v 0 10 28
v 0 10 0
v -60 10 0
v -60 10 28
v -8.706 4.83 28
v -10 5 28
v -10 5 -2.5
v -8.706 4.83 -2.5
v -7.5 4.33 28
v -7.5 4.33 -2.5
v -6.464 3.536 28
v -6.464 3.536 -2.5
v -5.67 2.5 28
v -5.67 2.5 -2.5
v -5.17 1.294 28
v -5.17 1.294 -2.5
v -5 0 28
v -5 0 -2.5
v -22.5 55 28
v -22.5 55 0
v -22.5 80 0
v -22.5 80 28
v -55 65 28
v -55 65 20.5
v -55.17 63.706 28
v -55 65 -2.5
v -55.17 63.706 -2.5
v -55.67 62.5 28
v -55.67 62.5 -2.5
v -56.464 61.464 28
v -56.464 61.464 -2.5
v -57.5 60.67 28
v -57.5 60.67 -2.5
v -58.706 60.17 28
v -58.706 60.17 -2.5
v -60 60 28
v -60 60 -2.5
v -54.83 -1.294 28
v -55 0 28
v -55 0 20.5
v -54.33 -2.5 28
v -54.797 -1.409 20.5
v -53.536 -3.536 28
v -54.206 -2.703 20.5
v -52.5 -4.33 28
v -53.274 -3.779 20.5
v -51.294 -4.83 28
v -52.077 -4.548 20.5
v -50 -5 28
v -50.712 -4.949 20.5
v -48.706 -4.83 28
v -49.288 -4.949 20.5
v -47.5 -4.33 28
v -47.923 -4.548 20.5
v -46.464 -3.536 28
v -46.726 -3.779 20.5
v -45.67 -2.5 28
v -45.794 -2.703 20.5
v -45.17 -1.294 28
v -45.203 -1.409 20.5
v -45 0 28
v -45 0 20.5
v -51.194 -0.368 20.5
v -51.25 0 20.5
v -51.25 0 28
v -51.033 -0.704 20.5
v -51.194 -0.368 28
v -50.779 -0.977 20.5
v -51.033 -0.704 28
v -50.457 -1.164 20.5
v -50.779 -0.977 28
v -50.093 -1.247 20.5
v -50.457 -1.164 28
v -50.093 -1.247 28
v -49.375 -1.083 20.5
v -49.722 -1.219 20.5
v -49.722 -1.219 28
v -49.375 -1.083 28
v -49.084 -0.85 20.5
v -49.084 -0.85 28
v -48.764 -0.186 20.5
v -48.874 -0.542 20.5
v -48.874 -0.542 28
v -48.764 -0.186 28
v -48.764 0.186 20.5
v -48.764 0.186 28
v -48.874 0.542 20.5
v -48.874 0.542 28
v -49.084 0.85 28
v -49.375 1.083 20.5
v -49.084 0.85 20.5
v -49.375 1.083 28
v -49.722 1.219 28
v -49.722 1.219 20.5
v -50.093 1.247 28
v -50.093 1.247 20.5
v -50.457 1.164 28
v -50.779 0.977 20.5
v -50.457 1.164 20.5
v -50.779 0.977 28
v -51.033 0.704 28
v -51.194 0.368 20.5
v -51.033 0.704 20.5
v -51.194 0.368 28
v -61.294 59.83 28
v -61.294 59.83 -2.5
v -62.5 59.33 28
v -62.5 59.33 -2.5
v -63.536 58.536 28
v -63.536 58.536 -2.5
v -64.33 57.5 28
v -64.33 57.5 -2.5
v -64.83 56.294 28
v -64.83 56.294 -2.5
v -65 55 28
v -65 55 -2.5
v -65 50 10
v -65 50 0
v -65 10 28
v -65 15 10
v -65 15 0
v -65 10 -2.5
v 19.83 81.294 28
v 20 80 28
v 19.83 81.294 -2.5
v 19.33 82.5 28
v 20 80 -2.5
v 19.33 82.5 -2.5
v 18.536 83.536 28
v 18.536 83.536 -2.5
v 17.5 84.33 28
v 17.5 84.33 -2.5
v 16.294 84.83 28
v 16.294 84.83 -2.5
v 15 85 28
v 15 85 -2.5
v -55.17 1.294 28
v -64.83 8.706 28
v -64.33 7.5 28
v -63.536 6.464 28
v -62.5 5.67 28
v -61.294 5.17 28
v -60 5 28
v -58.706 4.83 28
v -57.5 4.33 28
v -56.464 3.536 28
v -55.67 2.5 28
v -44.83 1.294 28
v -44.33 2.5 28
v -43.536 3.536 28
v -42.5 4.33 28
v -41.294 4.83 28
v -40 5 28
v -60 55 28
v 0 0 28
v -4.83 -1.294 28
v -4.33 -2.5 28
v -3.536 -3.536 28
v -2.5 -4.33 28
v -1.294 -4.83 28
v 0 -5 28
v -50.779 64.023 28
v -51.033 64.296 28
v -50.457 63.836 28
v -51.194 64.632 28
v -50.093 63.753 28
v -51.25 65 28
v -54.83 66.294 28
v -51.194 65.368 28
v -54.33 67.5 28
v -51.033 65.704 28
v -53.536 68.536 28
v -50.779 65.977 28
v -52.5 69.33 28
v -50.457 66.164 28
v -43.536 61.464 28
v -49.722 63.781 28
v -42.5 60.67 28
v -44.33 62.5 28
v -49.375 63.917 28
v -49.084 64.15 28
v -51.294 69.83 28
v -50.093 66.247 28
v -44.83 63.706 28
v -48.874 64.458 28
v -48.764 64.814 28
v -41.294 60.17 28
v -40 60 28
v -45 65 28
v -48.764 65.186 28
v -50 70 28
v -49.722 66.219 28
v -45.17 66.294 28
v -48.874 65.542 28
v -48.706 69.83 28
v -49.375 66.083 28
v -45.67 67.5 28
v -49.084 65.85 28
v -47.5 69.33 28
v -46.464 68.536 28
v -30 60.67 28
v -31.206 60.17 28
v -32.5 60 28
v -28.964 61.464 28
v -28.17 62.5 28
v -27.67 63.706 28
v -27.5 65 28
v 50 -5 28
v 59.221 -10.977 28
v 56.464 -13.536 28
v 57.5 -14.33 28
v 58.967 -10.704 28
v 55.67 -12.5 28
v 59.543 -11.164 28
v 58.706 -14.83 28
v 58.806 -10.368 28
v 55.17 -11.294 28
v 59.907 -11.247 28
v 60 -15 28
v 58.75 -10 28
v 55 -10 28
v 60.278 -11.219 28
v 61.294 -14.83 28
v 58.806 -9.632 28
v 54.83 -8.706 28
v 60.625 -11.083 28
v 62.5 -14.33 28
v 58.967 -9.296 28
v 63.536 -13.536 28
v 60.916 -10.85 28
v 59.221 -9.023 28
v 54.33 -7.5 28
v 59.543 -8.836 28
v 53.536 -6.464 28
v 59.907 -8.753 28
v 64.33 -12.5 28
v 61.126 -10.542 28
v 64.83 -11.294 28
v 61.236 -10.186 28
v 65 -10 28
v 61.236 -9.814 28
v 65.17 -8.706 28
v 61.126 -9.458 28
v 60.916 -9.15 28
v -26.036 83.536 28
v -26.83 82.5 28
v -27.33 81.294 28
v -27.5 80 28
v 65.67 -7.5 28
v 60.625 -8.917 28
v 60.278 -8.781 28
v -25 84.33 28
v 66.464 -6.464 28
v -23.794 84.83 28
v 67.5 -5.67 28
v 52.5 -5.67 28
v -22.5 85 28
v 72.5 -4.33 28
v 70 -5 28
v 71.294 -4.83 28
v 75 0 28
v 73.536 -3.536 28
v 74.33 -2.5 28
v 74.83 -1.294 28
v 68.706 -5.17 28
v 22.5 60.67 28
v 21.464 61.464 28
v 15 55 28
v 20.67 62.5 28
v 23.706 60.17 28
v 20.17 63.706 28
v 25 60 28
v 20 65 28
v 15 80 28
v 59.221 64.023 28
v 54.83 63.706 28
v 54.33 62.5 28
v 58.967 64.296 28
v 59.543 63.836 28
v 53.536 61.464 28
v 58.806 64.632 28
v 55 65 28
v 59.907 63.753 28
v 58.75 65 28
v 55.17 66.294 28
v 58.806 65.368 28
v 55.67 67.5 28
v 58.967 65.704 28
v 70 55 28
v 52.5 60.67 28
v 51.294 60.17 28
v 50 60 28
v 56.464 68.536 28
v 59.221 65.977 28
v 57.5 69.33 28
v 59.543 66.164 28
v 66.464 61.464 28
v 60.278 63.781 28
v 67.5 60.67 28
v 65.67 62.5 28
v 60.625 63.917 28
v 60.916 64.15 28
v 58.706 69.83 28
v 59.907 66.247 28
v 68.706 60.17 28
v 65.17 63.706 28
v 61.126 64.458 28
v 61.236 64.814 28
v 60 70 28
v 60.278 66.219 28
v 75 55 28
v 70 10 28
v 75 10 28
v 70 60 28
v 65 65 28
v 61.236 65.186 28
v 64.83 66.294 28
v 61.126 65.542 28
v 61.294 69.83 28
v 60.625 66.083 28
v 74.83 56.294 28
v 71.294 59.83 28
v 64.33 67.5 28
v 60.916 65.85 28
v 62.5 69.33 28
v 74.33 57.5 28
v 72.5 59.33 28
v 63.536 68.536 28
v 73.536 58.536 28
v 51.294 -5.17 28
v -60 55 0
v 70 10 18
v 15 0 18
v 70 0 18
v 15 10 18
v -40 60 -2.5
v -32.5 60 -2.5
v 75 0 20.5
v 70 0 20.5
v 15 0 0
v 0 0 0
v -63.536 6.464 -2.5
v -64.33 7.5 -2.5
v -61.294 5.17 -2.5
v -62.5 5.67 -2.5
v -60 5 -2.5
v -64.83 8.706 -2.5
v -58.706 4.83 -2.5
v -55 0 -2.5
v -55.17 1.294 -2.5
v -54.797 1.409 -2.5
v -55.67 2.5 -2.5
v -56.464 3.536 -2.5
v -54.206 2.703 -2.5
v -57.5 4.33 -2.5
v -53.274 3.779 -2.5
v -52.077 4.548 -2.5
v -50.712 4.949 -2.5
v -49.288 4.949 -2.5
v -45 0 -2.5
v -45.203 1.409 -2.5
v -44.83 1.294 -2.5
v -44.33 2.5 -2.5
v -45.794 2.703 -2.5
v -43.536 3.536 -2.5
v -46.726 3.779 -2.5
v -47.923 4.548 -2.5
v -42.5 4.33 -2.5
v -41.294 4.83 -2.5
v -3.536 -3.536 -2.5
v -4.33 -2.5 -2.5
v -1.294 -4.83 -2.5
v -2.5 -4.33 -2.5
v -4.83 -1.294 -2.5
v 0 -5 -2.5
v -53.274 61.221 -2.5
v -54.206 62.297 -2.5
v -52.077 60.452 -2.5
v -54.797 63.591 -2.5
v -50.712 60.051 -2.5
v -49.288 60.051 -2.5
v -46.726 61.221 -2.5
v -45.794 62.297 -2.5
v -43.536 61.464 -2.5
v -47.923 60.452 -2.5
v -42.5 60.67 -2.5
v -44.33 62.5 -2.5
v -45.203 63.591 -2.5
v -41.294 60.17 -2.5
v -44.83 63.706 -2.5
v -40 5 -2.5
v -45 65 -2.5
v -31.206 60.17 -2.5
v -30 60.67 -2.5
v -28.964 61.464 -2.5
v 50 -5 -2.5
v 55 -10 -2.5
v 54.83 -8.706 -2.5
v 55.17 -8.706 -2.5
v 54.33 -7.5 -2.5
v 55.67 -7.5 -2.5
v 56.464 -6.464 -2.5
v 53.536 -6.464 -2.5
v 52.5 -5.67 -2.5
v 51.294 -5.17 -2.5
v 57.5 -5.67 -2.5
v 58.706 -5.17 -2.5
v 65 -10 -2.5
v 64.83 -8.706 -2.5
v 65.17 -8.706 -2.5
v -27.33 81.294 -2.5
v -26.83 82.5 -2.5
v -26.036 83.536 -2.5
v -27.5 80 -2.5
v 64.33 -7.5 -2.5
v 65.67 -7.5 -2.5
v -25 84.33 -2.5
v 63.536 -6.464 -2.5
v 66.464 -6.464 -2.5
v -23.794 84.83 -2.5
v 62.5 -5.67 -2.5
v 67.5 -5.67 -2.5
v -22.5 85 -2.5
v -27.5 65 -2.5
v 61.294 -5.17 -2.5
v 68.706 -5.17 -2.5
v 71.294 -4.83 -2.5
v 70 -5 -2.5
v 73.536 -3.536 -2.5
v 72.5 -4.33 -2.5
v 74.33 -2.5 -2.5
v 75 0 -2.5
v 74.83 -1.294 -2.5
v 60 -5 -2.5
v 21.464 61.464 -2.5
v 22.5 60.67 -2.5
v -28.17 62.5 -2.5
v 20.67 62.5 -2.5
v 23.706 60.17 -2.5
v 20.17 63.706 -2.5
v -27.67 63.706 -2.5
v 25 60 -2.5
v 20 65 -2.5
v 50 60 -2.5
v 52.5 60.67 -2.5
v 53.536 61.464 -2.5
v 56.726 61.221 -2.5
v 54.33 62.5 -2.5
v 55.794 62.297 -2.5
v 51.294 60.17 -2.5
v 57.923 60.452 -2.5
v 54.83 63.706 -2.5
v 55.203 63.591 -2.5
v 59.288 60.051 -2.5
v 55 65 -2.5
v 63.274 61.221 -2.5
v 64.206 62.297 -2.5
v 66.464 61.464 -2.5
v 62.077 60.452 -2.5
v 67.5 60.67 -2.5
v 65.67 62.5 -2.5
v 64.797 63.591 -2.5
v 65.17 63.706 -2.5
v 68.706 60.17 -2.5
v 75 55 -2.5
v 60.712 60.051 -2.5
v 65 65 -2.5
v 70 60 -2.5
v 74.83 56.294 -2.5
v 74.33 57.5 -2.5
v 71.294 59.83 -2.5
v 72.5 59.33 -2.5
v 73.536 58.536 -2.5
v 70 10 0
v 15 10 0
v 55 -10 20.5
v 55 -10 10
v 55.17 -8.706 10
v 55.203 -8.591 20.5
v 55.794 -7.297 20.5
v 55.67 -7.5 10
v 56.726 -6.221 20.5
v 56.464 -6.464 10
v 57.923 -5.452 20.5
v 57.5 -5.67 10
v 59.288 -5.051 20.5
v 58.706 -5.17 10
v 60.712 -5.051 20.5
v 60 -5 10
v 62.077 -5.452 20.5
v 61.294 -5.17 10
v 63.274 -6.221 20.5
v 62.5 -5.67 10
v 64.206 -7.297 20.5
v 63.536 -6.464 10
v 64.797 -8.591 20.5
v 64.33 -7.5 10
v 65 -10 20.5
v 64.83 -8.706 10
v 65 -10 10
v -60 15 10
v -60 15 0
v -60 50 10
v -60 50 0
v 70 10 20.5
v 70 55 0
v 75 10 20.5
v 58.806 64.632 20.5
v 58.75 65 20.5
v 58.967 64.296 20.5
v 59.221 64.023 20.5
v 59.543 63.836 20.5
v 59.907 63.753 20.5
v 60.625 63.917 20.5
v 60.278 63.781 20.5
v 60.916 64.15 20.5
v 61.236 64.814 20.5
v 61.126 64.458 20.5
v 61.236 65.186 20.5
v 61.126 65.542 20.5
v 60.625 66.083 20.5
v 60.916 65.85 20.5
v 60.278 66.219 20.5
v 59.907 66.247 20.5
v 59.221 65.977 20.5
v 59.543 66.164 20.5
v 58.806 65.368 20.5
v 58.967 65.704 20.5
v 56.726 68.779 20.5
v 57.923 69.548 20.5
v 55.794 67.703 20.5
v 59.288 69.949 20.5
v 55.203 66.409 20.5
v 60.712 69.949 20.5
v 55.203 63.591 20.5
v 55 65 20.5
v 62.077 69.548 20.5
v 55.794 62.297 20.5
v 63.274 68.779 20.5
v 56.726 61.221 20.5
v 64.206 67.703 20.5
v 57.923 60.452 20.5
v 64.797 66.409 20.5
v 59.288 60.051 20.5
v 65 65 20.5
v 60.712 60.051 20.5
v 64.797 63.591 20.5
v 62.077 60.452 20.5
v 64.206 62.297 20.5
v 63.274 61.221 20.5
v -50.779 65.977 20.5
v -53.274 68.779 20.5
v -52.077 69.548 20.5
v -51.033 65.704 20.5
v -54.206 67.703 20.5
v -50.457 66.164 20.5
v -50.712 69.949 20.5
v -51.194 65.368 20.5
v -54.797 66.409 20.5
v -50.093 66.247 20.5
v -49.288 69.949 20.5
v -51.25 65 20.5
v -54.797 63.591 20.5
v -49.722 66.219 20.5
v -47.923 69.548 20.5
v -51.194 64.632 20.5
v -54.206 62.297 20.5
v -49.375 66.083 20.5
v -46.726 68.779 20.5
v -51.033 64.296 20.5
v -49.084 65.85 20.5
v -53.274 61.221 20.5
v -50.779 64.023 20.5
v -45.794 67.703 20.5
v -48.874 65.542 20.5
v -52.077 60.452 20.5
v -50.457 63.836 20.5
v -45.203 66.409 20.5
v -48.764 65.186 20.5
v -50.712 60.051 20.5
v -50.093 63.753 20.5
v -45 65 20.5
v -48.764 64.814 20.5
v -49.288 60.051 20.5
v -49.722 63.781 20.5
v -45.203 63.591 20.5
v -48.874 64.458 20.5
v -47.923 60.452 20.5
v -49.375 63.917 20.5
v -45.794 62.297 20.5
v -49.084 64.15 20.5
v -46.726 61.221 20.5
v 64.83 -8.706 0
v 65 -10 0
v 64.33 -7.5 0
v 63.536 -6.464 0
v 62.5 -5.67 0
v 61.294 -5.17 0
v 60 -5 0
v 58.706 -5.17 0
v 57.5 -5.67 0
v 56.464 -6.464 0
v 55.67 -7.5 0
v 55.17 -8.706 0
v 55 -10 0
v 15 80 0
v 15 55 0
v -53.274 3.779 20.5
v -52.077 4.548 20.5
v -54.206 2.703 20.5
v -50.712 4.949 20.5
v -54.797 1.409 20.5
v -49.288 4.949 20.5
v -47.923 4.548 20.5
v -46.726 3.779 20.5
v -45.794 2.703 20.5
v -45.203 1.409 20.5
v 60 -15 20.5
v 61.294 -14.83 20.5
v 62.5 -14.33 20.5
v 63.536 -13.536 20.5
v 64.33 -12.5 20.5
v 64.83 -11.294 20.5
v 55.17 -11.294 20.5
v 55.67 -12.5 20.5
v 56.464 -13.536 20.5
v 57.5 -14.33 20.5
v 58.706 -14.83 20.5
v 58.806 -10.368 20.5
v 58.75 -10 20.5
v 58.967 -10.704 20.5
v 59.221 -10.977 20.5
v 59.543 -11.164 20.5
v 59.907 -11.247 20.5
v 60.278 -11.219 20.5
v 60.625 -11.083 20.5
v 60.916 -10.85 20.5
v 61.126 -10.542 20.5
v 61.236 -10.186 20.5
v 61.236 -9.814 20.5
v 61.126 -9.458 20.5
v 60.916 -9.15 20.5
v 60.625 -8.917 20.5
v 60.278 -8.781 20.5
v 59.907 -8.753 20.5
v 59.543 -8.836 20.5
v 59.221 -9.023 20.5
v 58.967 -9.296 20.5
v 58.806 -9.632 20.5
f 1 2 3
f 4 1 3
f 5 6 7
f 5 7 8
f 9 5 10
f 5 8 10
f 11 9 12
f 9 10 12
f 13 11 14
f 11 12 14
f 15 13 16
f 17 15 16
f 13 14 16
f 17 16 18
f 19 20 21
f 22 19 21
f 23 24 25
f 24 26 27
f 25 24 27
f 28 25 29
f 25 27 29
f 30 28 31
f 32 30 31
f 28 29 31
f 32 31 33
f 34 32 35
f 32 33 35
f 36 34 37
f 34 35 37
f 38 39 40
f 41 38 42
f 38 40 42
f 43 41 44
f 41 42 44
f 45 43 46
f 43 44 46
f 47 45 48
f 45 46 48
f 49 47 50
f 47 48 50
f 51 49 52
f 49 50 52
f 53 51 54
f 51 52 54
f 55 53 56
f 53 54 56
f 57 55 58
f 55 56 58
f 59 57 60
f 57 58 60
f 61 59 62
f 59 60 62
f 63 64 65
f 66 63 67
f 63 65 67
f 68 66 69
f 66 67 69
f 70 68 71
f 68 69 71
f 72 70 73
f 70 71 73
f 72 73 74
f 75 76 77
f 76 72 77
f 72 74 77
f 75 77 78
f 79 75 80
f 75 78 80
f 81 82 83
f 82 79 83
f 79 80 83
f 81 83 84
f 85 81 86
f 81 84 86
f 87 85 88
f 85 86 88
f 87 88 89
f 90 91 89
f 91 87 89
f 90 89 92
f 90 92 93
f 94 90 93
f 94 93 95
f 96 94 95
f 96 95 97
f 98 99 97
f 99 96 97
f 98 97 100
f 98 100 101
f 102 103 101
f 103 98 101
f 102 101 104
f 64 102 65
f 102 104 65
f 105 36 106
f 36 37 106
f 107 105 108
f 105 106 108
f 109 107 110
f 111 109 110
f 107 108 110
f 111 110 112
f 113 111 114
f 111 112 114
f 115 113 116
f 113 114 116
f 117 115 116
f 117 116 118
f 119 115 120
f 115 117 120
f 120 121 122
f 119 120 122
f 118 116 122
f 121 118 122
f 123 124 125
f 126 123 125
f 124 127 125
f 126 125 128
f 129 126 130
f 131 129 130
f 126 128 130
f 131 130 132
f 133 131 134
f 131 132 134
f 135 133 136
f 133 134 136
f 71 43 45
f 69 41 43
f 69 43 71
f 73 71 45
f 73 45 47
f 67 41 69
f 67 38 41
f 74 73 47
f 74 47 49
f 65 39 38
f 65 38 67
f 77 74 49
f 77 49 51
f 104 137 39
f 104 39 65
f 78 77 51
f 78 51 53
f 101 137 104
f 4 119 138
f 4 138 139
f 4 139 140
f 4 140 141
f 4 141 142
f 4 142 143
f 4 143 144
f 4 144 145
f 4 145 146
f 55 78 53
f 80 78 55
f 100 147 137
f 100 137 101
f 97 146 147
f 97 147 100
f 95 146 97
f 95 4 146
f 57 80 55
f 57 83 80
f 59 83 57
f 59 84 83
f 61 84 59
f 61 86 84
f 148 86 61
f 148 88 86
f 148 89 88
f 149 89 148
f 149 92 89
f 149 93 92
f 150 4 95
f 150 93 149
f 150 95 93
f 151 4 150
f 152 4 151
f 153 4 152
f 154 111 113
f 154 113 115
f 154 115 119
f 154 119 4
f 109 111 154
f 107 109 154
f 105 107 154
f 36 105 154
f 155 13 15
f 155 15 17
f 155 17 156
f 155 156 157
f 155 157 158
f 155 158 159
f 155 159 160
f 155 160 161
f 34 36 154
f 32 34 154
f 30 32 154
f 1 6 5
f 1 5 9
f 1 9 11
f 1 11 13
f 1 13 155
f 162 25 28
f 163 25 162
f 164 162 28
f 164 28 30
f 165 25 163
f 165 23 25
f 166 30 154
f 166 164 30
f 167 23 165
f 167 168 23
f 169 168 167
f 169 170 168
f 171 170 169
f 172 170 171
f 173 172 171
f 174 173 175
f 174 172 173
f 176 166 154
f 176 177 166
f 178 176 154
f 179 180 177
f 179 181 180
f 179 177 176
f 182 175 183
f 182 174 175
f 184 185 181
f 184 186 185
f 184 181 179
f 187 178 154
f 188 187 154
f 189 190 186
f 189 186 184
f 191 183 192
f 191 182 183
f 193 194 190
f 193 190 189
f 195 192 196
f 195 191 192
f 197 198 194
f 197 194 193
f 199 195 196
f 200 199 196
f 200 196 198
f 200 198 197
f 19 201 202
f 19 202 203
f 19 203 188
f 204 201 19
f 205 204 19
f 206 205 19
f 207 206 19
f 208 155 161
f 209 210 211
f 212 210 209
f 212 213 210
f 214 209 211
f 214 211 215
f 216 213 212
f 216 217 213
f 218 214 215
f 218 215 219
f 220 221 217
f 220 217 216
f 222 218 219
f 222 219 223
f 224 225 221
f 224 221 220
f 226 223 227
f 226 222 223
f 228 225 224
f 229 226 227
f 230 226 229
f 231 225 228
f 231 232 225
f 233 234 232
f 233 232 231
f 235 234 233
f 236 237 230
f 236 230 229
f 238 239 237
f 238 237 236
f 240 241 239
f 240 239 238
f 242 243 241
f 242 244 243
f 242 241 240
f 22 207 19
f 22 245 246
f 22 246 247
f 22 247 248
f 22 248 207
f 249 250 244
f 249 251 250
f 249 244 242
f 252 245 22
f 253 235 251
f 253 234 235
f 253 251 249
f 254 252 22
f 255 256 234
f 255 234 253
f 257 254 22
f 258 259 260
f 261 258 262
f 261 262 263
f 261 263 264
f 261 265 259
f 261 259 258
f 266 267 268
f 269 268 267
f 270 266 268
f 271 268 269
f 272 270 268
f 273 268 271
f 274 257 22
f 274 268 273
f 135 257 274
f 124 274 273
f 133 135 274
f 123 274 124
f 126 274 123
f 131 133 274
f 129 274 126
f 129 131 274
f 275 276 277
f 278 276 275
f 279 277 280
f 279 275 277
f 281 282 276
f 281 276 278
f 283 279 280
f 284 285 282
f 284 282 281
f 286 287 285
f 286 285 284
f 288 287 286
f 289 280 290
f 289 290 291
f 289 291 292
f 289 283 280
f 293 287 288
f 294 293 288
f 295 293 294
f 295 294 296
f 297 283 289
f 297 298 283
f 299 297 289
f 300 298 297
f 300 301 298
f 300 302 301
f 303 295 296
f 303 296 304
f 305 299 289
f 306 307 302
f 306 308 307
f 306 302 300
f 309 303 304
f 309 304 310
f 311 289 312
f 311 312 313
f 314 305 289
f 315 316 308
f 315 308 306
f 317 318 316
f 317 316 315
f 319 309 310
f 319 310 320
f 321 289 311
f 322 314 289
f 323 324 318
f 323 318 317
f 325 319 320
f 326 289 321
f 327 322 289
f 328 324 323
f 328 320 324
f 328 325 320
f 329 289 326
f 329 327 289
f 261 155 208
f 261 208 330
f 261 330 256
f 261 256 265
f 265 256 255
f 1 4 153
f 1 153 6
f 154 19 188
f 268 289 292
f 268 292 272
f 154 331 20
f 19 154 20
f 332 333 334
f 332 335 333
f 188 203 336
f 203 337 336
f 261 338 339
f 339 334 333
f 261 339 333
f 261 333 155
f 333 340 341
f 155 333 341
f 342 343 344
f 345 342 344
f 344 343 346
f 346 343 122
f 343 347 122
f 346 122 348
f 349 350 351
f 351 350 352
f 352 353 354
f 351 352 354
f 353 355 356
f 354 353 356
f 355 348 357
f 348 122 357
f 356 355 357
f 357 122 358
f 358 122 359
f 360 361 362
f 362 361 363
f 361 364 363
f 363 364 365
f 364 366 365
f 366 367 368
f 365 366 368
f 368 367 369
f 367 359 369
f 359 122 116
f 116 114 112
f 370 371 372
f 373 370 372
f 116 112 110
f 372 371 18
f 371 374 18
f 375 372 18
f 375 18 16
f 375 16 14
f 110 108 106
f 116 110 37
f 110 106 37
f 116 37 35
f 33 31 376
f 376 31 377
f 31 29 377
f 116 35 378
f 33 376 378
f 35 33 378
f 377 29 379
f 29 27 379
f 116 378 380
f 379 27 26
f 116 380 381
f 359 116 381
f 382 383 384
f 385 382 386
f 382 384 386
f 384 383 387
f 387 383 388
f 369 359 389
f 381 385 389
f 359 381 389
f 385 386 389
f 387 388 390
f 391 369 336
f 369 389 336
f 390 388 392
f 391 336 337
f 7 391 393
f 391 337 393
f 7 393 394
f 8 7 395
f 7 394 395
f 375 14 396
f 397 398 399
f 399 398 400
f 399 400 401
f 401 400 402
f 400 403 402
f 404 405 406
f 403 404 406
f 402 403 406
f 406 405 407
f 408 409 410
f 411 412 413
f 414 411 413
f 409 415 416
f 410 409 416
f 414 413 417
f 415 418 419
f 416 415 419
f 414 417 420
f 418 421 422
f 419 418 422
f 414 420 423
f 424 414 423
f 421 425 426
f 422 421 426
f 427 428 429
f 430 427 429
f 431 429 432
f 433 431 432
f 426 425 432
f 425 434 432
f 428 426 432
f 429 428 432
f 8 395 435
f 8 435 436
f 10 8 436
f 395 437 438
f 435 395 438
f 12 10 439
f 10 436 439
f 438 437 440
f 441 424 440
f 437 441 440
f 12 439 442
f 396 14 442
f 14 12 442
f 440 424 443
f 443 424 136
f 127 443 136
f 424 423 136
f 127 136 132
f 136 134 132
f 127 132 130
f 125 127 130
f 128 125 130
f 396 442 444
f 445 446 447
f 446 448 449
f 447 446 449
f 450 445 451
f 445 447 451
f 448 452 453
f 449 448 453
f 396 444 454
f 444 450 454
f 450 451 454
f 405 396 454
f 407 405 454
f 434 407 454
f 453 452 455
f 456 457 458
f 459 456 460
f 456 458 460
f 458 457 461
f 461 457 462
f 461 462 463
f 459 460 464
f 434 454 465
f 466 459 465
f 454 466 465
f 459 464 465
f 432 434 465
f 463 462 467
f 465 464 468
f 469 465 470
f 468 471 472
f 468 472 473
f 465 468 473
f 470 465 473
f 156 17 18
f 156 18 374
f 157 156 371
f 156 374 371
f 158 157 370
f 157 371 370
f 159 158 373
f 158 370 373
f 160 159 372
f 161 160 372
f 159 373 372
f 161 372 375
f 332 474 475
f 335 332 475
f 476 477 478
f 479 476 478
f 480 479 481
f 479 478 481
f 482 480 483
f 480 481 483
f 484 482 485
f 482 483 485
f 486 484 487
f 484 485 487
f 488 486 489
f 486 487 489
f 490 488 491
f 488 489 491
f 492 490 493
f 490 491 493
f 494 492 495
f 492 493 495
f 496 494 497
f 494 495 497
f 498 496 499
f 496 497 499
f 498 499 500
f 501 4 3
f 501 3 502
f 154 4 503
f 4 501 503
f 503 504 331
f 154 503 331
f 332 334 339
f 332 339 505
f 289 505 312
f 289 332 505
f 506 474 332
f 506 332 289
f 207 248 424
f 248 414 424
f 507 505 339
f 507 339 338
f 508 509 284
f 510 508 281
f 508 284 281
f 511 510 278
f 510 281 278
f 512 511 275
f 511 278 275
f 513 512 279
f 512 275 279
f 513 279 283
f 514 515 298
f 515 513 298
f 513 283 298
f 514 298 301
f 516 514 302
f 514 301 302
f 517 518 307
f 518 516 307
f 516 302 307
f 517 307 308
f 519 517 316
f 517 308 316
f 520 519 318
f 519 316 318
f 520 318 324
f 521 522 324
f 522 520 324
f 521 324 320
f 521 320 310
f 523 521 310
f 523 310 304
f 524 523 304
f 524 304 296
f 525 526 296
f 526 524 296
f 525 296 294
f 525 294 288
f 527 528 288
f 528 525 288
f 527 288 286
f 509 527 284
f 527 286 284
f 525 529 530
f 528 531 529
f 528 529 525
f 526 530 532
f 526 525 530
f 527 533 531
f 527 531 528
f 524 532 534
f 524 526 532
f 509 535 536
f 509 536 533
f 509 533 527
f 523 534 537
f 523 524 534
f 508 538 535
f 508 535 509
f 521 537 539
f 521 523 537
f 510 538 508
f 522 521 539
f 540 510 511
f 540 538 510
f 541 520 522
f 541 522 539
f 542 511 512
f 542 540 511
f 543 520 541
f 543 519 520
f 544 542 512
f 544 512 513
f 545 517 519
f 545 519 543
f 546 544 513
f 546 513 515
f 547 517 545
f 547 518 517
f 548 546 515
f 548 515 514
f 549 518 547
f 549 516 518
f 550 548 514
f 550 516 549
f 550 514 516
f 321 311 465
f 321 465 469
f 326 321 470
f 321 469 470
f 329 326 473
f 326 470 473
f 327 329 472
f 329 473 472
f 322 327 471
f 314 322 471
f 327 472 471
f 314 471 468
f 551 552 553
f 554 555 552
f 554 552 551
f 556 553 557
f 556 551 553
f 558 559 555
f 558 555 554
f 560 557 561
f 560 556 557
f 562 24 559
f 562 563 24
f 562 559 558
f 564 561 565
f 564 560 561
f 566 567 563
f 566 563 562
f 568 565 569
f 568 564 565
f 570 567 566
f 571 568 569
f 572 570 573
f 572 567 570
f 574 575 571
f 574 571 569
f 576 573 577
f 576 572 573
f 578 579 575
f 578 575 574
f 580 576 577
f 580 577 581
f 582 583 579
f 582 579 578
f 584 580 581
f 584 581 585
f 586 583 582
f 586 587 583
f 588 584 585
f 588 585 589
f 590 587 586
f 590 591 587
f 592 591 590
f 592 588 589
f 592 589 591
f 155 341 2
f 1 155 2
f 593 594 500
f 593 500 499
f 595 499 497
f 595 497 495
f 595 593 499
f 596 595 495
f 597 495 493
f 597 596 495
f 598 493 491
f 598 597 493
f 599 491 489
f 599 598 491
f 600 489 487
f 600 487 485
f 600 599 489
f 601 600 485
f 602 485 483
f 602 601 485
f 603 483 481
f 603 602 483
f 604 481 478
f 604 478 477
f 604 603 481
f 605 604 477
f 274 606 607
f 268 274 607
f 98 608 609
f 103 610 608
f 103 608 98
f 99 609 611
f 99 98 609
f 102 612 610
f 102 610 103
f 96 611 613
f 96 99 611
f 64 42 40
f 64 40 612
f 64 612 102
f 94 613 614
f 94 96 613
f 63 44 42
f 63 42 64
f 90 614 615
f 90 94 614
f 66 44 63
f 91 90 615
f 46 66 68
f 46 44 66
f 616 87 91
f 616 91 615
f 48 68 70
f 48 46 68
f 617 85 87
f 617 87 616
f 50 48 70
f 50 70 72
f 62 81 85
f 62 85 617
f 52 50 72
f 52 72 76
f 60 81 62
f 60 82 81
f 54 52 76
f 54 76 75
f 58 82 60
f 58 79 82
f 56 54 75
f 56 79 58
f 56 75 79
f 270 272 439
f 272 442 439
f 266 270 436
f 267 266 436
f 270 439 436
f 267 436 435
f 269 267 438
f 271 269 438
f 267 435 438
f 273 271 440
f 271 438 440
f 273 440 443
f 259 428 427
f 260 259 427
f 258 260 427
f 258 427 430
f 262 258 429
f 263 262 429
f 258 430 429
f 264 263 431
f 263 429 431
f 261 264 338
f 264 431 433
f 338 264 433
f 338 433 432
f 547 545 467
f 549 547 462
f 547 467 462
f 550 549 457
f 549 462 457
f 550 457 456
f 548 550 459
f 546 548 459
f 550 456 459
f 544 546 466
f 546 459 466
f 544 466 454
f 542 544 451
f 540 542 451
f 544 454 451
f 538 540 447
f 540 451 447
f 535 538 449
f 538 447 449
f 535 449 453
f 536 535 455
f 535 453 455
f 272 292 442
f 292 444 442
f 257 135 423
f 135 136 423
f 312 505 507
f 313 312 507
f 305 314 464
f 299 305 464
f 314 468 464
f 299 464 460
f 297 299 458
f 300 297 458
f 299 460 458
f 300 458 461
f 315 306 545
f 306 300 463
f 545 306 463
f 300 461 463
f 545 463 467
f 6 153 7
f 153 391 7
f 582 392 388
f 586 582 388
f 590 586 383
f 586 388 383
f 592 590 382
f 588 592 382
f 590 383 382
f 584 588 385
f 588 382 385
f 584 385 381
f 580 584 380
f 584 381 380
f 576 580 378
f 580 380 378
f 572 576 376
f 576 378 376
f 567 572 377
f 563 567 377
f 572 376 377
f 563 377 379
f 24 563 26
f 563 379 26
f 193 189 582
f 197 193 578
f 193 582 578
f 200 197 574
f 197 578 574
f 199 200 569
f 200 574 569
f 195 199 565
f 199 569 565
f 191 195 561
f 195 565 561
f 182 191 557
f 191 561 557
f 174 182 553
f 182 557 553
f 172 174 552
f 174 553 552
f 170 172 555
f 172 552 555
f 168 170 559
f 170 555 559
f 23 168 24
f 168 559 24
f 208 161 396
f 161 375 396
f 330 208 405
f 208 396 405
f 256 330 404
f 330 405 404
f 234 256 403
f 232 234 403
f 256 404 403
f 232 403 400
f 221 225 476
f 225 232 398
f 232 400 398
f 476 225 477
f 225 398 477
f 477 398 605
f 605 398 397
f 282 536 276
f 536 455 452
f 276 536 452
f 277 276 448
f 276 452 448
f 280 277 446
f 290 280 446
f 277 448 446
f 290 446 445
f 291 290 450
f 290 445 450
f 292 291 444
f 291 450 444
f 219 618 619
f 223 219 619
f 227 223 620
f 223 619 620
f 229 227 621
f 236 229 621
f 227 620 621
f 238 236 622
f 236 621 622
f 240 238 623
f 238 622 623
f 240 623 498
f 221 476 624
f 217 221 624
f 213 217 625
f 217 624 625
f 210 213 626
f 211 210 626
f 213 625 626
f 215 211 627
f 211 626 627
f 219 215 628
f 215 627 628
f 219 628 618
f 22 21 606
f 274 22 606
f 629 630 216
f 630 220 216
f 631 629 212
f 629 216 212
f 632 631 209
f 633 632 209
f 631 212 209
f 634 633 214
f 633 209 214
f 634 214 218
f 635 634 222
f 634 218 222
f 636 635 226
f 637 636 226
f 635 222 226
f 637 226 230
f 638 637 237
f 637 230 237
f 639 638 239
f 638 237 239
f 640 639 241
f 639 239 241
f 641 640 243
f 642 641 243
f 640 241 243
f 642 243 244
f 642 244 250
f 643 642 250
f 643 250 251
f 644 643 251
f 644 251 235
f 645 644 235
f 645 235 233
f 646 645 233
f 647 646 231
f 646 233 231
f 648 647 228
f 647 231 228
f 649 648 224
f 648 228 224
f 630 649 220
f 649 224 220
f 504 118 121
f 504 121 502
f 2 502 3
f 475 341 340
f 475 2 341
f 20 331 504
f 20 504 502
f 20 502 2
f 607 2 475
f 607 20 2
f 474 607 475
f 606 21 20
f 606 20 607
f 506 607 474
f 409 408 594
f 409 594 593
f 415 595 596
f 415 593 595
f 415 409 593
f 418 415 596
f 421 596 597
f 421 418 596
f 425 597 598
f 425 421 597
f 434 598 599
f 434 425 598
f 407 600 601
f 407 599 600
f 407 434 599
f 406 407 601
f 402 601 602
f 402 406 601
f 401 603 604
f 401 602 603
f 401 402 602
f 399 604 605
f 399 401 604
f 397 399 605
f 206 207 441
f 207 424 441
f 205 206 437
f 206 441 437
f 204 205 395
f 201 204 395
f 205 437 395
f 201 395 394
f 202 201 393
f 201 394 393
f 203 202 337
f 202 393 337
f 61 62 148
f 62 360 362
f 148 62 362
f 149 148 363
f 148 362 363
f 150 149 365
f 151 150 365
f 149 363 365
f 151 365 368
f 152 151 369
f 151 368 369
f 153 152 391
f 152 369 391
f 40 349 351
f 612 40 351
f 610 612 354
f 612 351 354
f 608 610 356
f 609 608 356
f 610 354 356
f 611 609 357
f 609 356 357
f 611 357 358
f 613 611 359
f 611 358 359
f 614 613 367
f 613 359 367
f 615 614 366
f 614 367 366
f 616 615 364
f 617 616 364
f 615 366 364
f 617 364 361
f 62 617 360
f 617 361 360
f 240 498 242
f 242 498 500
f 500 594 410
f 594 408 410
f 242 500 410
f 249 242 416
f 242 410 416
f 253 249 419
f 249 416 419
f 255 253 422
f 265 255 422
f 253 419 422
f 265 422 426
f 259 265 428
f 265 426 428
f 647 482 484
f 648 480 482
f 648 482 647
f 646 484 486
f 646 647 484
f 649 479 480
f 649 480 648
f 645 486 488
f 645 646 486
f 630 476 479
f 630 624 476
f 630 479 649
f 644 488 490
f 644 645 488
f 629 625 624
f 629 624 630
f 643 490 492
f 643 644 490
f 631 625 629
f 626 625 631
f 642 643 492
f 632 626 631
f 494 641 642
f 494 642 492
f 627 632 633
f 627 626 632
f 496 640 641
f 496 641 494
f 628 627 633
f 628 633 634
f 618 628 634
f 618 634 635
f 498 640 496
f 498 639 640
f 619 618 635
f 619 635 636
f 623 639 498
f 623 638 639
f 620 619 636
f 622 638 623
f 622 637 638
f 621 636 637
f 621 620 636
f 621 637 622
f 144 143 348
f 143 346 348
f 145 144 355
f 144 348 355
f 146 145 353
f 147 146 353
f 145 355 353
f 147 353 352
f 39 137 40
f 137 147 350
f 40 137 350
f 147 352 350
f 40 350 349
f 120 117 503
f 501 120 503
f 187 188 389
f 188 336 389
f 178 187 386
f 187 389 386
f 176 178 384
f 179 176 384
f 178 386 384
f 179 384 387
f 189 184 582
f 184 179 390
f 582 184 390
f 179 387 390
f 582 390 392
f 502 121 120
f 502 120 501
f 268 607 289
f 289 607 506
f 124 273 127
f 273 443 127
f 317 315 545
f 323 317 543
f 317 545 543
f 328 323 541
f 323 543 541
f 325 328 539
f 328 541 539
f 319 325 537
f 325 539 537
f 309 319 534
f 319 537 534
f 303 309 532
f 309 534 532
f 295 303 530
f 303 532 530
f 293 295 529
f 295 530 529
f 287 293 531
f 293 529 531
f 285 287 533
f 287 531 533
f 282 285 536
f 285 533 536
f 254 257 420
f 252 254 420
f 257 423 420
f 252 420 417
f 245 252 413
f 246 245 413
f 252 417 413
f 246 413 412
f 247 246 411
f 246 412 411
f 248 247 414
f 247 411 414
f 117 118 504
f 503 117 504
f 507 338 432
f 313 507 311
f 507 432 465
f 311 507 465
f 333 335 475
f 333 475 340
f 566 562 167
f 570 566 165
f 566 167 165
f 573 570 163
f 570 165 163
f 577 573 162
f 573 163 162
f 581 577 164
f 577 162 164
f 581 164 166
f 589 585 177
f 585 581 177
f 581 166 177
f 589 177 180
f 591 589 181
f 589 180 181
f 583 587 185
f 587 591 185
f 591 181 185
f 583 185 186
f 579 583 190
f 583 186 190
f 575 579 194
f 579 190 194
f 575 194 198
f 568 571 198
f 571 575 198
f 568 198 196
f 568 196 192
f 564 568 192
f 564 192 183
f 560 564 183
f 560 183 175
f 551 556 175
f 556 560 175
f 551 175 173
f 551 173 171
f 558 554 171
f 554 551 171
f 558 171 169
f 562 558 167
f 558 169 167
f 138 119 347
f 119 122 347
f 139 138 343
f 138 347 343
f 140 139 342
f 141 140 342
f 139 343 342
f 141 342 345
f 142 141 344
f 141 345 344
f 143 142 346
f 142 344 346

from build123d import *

# Parameters (mm, degrees)
F1_W      = 5
F1_H      = 10
F1_H_2    = 35
F2_DEPTH  = 2.5
F3_DEPTH  = 28
F5_D      = 2.5
F6_DEPTH  = 20.5
F7_DEPTH  = 18
F8_DEPTH  = 10
F9_R      = 1.25
F10_DEPTH = 23


with BuildPart() as f2:
    # F1 (on Top) → F2 (new body)
    with BuildSketch(Plane.XY):
        Polygon((0, 0), (70, 0), (70, 10), (70, 55), (15, 55), (15, 80), (-22.5, 80), (-22.5, 55), (-60, 55), (-60, 50), (-60, 15), (-60, 10), (0, 10), align=None)
        with BuildLine():
            Line((70, 10), (75, 10))
            Line((75, 10), (75, 55))
            ThreePointArc((75, 55), (73.5355339059, 58.5355339059), (70, 60))
            ThreePointArc((70, 60), (66.4644660941, 61.4644660941), (65, 65))
            ThreePointArc((65, 65), (60, 60), (55, 65))
            ThreePointArc((55, 65), (53.5355339059, 61.4644660941), (50, 60))
            Line((50, 60), (25, 60))
            ThreePointArc((25, 60), (21.4644660941, 61.4644660941), (20, 65))
            Line((20, 65), (20, 80))
            ThreePointArc((20, 80), (18.5355339059, 83.5355339059), (15, 85))
            Line((15, 85), (-22.5, 85))
            ThreePointArc((-22.5, 85), (-26.0355339059, 83.5355339059), (-27.5, 80))
            Line((-27.5, 80), (-27.5, 65))
            ThreePointArc((-27.5, 65), (-28.9644660941, 61.4644660941), (-32.5, 60))
            Line((-32.5, 60), (-40, 60))
            ThreePointArc((-40, 60), (-43.5355339059, 61.4644660941), (-45, 65))
            ThreePointArc((-45, 65), (-50, 60), (-55, 65))
            ThreePointArc((-55, 65), (-56.4644660941, 61.4644660941), (-60, 60))
            ThreePointArc((-60, 60), (-63.5355339059, 58.5355339059), (-65, 55))
            Line((-65, 55), (-65, 50))
            Line((-65, 50), (-60, 50))
            Line((-60, 50), (-60, 55))
            Line((-60, 55), (-22.5, 55))
            Line((-22.5, 55), (-22.5, 80))
            Line((-22.5, 80), (15, 80))
            Line((15, 80), (15, 55))
            Line((15, 55), (70, 55))
            Line((70, 55), (70, 10))
        make_face()
        with Locations((72.5, 5)):
            Rectangle(F1_W, F1_H)
        with BuildLine():
            ThreePointArc((-50, 70), (-53.5355339059, 68.5355339059), (-55, 65))
            ThreePointArc((-55, 65), (-50, 60), (-45, 65))
            ThreePointArc((-45, 65), (-46.4644660941, 68.5355339059), (-50, 70))
        make_face()
        with BuildLine():
            ThreePointArc((55, 65), (60, 60), (65, 65))
            ThreePointArc((65, 65), (63.5355339059, 68.5355339059), (60, 70))
            ThreePointArc((60, 70), (56.4644660941, 68.5355339059), (55, 65))
        make_face()
        with BuildLine():
            ThreePointArc((-45, 0), (-50, 5), (-55, 0))
            ThreePointArc((-55, 0), (-53.5355339059, -3.5355339059), (-50, -5))
            ThreePointArc((-50, -5), (-46.4644660941, -3.5355339059), (-45, 0))
        make_face()
        with Locations((-62.5, 32.5)):
            Rectangle(F1_W, F1_H_2)
        with BuildLine():
            ThreePointArc((70, -5), (73.5355339059, -3.5355339059), (75, 0))
            Line((75, 0), (70, 0))
            Line((70, 0), (0, 0))
            Line((0, 0), (0, 10))
            Line((0, 10), (-60, 10))
            Line((-60, 10), (-60, 15))
            Line((-60, 15), (-65, 15))
            Line((-65, 15), (-65, 10))
            ThreePointArc((-65, 10), (-63.5355339059, 6.4644660941), (-60, 5))
            ThreePointArc((-60, 5), (-56.4644660941, 3.5355339059), (-55, 0))
            ThreePointArc((-55, 0), (-50, 5), (-45, 0))
            ThreePointArc((-45, 0), (-43.5355339059, 3.5355339059), (-40, 5))
            Line((-40, 5), (-10, 5))
            ThreePointArc((-10, 5), (-6.4644660941, 3.5355339059), (-5, 0))
            ThreePointArc((-5, 0), (-3.5355339059, -3.5355339059), (0, -5))
            Line((0, -5), (50, -5))
            ThreePointArc((50, -5), (53.5355339059, -6.4644660941), (55, -10))
            ThreePointArc((55, -10), (56.4644660941, -6.4644660941), (60, -5))
            ThreePointArc((60, -5), (63.5355339059, -6.4644660941), (65, -10))
            ThreePointArc((65, -10), (66.4644660941, -6.4644660941), (70, -5))
        make_face()
    extrude(amount=-F2_DEPTH)

    # F1 (on Top) → F3 (join)
    with BuildSketch(Plane.XY):
        with BuildLine():
            ThreePointArc((70, -5), (73.5355339059, -3.5355339059), (75, 0))
            Line((75, 0), (70, 0))
            Line((70, 0), (0, 0))
            Line((0, 0), (0, 10))
            Line((0, 10), (-60, 10))
            Line((-60, 10), (-60, 15))
            Line((-60, 15), (-65, 15))
            Line((-65, 15), (-65, 10))
            ThreePointArc((-65, 10), (-63.5355339059, 6.4644660941), (-60, 5))
            ThreePointArc((-60, 5), (-56.4644660941, 3.5355339059), (-55, 0))
            ThreePointArc((-55, 0), (-50, 5), (-45, 0))
            ThreePointArc((-45, 0), (-43.5355339059, 3.5355339059), (-40, 5))
            Line((-40, 5), (-10, 5))
            ThreePointArc((-10, 5), (-6.4644660941, 3.5355339059), (-5, 0))
            ThreePointArc((-5, 0), (-3.5355339059, -3.5355339059), (0, -5))
            Line((0, -5), (50, -5))
            ThreePointArc((50, -5), (53.5355339059, -6.4644660941), (55, -10))
            ThreePointArc((55, -10), (56.4644660941, -6.4644660941), (60, -5))
            ThreePointArc((60, -5), (63.5355339059, -6.4644660941), (65, -10))
            ThreePointArc((65, -10), (66.4644660941, -6.4644660941), (70, -5))
        make_face()
        with BuildLine():
            Line((70, 10), (75, 10))
            Line((75, 10), (75, 55))
            ThreePointArc((75, 55), (73.5355339059, 58.5355339059), (70, 60))
            ThreePointArc((70, 60), (66.4644660941, 61.4644660941), (65, 65))
            ThreePointArc((65, 65), (60, 60), (55, 65))
            ThreePointArc((55, 65), (53.5355339059, 61.4644660941), (50, 60))
            Line((50, 60), (25, 60))
            ThreePointArc((25, 60), (21.4644660941, 61.4644660941), (20, 65))
            Line((20, 65), (20, 80))
            ThreePointArc((20, 80), (18.5355339059, 83.5355339059), (15, 85))
            Line((15, 85), (-22.5, 85))
            ThreePointArc((-22.5, 85), (-26.0355339059, 83.5355339059), (-27.5, 80))
            Line((-27.5, 80), (-27.5, 65))
            ThreePointArc((-27.5, 65), (-28.9644660941, 61.4644660941), (-32.5, 60))
            Line((-32.5, 60), (-40, 60))
            ThreePointArc((-40, 60), (-43.5355339059, 61.4644660941), (-45, 65))
            ThreePointArc((-45, 65), (-50, 60), (-55, 65))
            ThreePointArc((-55, 65), (-56.4644660941, 61.4644660941), (-60, 60))
            ThreePointArc((-60, 60), (-63.5355339059, 58.5355339059), (-65, 55))
            Line((-65, 55), (-65, 50))
            Line((-65, 50), (-60, 50))
            Line((-60, 50), (-60, 55))
            Line((-60, 55), (-22.5, 55))
            Line((-22.5, 55), (-22.5, 80))
            Line((-22.5, 80), (15, 80))
            Line((15, 80), (15, 55))
            Line((15, 55), (70, 55))
            Line((70, 55), (70, 10))
        make_face()
        with BuildLine():
            ThreePointArc((60, -15), (63.5355339059, -13.5355339059), (65, -10))
            ThreePointArc((65, -10), (63.5355339059, -6.4644660941), (60, -5))
            ThreePointArc((60, -5), (56.4644660941, -6.4644660941), (55, -10))
            ThreePointArc((55, -10), (56.4644660941, -13.5355339059), (60, -15))
        make_face()
        with BuildLine():
            ThreePointArc((55, 65), (60, 60), (65, 65))
            ThreePointArc((65, 65), (63.5355339059, 68.5355339059), (60, 70))
            ThreePointArc((60, 70), (56.4644660941, 68.5355339059), (55, 65))
        make_face()
        with Locations((-62.5, 32.5)):
            Rectangle(F1_W, F1_H_2)
        with BuildLine():
            ThreePointArc((-45, 0), (-50, 5), (-55, 0))
            ThreePointArc((-55, 0), (-53.5355339059, -3.5355339059), (-50, -5))
            ThreePointArc((-50, -5), (-46.4644660941, -3.5355339059), (-45, 0))
        make_face()
        with BuildLine():
            ThreePointArc((-50, 70), (-53.5355339059, 68.5355339059), (-55, 65))
            ThreePointArc((-55, 65), (-50, 60), (-45, 65))
            ThreePointArc((-45, 65), (-46.4644660941, 68.5355339059), (-50, 70))
        make_face()
    extrude(amount=F3_DEPTH)

    # F5 (through all)
    with Locations(Plane(origin=(0, 0, -2.5), x_dir=(1, 0, 0), z_dir=(0, 0, -1))):
        with Locations((-50, 0), (60, 10), (60, -65), (-50, -65)):
            Hole(F5_D / 2)

    # F1 (on Top) → F6 (join)
    with BuildSketch(Plane.XY):
        with Locations((72.5, 5)):
            Rectangle(F1_W, F1_H)
    extrude(amount=F6_DEPTH)

    # F0 (on Top) → F7 (join)
    with BuildSketch(Plane.XY):
        Polygon((15, 5), (15, 0), (35, 0), (35, 5), (35, 10), (15, 10), align=None)
        Polygon((35, 5), (35, 0), (70, 0), (70, 10), (35, 10), align=None)
    extrude(amount=F7_DEPTH)

    # F1 (on Top) → F8 (cut)
    with BuildSketch(Plane.XY):
        with BuildLine():
            ThreePointArc((60, -15), (63.5355339059, -13.5355339059), (65, -10))
            ThreePointArc((65, -10), (63.5355339059, -6.4644660941), (60, -5))
            ThreePointArc((60, -5), (56.4644660941, -6.4644660941), (55, -10))
            ThreePointArc((55, -10), (56.4644660941, -13.5355339059), (60, -15))
        make_face()
        with Locations((-62.5, 32.5)):
            Rectangle(F1_W, F1_H_2)
    extrude(amount=F8_DEPTH, mode=Mode.SUBTRACT)

    # F9 (on face) → F10 (cut)
    with BuildSketch(Plane(origin=(0, 0, -2.5), x_dir=(1, 0, 0), z_dir=(0, 0, -1))):
        with BuildLine():
            ThreePointArc((-55, 0), (-50, -5), (-45, 0))
            ThreePointArc((-45, 0), (-50, 5), (-55, 0))
        make_face()
        with Locations((-50, 0)):
            Circle(F9_R, mode=Mode.SUBTRACT)
        with BuildLine():
            ThreePointArc((-45, -65), (-50, -60), (-55, -65))
            ThreePointArc((-55, -65), (-50, -70), (-45, -65))
        make_face()
        with Locations((-50, -65)):
            Circle(F9_R, mode=Mode.SUBTRACT)
        with BuildLine():
            ThreePointArc((65, 10), (60, 15), (55, 10))
            ThreePointArc((55, 10), (60, 5), (65, 10))
        make_face()
        with BuildLine():
            ThreePointArc((55, -65), (60, -70), (65, -65))
            ThreePointArc((65, -65), (60, -60), (55, -65))
        make_face()
        with Locations((60, -65)):
            Circle(F9_R, mode=Mode.SUBTRACT)
    extrude(amount=-F10_DEPTH, mode=Mode.SUBTRACT)


solid = f2.part
